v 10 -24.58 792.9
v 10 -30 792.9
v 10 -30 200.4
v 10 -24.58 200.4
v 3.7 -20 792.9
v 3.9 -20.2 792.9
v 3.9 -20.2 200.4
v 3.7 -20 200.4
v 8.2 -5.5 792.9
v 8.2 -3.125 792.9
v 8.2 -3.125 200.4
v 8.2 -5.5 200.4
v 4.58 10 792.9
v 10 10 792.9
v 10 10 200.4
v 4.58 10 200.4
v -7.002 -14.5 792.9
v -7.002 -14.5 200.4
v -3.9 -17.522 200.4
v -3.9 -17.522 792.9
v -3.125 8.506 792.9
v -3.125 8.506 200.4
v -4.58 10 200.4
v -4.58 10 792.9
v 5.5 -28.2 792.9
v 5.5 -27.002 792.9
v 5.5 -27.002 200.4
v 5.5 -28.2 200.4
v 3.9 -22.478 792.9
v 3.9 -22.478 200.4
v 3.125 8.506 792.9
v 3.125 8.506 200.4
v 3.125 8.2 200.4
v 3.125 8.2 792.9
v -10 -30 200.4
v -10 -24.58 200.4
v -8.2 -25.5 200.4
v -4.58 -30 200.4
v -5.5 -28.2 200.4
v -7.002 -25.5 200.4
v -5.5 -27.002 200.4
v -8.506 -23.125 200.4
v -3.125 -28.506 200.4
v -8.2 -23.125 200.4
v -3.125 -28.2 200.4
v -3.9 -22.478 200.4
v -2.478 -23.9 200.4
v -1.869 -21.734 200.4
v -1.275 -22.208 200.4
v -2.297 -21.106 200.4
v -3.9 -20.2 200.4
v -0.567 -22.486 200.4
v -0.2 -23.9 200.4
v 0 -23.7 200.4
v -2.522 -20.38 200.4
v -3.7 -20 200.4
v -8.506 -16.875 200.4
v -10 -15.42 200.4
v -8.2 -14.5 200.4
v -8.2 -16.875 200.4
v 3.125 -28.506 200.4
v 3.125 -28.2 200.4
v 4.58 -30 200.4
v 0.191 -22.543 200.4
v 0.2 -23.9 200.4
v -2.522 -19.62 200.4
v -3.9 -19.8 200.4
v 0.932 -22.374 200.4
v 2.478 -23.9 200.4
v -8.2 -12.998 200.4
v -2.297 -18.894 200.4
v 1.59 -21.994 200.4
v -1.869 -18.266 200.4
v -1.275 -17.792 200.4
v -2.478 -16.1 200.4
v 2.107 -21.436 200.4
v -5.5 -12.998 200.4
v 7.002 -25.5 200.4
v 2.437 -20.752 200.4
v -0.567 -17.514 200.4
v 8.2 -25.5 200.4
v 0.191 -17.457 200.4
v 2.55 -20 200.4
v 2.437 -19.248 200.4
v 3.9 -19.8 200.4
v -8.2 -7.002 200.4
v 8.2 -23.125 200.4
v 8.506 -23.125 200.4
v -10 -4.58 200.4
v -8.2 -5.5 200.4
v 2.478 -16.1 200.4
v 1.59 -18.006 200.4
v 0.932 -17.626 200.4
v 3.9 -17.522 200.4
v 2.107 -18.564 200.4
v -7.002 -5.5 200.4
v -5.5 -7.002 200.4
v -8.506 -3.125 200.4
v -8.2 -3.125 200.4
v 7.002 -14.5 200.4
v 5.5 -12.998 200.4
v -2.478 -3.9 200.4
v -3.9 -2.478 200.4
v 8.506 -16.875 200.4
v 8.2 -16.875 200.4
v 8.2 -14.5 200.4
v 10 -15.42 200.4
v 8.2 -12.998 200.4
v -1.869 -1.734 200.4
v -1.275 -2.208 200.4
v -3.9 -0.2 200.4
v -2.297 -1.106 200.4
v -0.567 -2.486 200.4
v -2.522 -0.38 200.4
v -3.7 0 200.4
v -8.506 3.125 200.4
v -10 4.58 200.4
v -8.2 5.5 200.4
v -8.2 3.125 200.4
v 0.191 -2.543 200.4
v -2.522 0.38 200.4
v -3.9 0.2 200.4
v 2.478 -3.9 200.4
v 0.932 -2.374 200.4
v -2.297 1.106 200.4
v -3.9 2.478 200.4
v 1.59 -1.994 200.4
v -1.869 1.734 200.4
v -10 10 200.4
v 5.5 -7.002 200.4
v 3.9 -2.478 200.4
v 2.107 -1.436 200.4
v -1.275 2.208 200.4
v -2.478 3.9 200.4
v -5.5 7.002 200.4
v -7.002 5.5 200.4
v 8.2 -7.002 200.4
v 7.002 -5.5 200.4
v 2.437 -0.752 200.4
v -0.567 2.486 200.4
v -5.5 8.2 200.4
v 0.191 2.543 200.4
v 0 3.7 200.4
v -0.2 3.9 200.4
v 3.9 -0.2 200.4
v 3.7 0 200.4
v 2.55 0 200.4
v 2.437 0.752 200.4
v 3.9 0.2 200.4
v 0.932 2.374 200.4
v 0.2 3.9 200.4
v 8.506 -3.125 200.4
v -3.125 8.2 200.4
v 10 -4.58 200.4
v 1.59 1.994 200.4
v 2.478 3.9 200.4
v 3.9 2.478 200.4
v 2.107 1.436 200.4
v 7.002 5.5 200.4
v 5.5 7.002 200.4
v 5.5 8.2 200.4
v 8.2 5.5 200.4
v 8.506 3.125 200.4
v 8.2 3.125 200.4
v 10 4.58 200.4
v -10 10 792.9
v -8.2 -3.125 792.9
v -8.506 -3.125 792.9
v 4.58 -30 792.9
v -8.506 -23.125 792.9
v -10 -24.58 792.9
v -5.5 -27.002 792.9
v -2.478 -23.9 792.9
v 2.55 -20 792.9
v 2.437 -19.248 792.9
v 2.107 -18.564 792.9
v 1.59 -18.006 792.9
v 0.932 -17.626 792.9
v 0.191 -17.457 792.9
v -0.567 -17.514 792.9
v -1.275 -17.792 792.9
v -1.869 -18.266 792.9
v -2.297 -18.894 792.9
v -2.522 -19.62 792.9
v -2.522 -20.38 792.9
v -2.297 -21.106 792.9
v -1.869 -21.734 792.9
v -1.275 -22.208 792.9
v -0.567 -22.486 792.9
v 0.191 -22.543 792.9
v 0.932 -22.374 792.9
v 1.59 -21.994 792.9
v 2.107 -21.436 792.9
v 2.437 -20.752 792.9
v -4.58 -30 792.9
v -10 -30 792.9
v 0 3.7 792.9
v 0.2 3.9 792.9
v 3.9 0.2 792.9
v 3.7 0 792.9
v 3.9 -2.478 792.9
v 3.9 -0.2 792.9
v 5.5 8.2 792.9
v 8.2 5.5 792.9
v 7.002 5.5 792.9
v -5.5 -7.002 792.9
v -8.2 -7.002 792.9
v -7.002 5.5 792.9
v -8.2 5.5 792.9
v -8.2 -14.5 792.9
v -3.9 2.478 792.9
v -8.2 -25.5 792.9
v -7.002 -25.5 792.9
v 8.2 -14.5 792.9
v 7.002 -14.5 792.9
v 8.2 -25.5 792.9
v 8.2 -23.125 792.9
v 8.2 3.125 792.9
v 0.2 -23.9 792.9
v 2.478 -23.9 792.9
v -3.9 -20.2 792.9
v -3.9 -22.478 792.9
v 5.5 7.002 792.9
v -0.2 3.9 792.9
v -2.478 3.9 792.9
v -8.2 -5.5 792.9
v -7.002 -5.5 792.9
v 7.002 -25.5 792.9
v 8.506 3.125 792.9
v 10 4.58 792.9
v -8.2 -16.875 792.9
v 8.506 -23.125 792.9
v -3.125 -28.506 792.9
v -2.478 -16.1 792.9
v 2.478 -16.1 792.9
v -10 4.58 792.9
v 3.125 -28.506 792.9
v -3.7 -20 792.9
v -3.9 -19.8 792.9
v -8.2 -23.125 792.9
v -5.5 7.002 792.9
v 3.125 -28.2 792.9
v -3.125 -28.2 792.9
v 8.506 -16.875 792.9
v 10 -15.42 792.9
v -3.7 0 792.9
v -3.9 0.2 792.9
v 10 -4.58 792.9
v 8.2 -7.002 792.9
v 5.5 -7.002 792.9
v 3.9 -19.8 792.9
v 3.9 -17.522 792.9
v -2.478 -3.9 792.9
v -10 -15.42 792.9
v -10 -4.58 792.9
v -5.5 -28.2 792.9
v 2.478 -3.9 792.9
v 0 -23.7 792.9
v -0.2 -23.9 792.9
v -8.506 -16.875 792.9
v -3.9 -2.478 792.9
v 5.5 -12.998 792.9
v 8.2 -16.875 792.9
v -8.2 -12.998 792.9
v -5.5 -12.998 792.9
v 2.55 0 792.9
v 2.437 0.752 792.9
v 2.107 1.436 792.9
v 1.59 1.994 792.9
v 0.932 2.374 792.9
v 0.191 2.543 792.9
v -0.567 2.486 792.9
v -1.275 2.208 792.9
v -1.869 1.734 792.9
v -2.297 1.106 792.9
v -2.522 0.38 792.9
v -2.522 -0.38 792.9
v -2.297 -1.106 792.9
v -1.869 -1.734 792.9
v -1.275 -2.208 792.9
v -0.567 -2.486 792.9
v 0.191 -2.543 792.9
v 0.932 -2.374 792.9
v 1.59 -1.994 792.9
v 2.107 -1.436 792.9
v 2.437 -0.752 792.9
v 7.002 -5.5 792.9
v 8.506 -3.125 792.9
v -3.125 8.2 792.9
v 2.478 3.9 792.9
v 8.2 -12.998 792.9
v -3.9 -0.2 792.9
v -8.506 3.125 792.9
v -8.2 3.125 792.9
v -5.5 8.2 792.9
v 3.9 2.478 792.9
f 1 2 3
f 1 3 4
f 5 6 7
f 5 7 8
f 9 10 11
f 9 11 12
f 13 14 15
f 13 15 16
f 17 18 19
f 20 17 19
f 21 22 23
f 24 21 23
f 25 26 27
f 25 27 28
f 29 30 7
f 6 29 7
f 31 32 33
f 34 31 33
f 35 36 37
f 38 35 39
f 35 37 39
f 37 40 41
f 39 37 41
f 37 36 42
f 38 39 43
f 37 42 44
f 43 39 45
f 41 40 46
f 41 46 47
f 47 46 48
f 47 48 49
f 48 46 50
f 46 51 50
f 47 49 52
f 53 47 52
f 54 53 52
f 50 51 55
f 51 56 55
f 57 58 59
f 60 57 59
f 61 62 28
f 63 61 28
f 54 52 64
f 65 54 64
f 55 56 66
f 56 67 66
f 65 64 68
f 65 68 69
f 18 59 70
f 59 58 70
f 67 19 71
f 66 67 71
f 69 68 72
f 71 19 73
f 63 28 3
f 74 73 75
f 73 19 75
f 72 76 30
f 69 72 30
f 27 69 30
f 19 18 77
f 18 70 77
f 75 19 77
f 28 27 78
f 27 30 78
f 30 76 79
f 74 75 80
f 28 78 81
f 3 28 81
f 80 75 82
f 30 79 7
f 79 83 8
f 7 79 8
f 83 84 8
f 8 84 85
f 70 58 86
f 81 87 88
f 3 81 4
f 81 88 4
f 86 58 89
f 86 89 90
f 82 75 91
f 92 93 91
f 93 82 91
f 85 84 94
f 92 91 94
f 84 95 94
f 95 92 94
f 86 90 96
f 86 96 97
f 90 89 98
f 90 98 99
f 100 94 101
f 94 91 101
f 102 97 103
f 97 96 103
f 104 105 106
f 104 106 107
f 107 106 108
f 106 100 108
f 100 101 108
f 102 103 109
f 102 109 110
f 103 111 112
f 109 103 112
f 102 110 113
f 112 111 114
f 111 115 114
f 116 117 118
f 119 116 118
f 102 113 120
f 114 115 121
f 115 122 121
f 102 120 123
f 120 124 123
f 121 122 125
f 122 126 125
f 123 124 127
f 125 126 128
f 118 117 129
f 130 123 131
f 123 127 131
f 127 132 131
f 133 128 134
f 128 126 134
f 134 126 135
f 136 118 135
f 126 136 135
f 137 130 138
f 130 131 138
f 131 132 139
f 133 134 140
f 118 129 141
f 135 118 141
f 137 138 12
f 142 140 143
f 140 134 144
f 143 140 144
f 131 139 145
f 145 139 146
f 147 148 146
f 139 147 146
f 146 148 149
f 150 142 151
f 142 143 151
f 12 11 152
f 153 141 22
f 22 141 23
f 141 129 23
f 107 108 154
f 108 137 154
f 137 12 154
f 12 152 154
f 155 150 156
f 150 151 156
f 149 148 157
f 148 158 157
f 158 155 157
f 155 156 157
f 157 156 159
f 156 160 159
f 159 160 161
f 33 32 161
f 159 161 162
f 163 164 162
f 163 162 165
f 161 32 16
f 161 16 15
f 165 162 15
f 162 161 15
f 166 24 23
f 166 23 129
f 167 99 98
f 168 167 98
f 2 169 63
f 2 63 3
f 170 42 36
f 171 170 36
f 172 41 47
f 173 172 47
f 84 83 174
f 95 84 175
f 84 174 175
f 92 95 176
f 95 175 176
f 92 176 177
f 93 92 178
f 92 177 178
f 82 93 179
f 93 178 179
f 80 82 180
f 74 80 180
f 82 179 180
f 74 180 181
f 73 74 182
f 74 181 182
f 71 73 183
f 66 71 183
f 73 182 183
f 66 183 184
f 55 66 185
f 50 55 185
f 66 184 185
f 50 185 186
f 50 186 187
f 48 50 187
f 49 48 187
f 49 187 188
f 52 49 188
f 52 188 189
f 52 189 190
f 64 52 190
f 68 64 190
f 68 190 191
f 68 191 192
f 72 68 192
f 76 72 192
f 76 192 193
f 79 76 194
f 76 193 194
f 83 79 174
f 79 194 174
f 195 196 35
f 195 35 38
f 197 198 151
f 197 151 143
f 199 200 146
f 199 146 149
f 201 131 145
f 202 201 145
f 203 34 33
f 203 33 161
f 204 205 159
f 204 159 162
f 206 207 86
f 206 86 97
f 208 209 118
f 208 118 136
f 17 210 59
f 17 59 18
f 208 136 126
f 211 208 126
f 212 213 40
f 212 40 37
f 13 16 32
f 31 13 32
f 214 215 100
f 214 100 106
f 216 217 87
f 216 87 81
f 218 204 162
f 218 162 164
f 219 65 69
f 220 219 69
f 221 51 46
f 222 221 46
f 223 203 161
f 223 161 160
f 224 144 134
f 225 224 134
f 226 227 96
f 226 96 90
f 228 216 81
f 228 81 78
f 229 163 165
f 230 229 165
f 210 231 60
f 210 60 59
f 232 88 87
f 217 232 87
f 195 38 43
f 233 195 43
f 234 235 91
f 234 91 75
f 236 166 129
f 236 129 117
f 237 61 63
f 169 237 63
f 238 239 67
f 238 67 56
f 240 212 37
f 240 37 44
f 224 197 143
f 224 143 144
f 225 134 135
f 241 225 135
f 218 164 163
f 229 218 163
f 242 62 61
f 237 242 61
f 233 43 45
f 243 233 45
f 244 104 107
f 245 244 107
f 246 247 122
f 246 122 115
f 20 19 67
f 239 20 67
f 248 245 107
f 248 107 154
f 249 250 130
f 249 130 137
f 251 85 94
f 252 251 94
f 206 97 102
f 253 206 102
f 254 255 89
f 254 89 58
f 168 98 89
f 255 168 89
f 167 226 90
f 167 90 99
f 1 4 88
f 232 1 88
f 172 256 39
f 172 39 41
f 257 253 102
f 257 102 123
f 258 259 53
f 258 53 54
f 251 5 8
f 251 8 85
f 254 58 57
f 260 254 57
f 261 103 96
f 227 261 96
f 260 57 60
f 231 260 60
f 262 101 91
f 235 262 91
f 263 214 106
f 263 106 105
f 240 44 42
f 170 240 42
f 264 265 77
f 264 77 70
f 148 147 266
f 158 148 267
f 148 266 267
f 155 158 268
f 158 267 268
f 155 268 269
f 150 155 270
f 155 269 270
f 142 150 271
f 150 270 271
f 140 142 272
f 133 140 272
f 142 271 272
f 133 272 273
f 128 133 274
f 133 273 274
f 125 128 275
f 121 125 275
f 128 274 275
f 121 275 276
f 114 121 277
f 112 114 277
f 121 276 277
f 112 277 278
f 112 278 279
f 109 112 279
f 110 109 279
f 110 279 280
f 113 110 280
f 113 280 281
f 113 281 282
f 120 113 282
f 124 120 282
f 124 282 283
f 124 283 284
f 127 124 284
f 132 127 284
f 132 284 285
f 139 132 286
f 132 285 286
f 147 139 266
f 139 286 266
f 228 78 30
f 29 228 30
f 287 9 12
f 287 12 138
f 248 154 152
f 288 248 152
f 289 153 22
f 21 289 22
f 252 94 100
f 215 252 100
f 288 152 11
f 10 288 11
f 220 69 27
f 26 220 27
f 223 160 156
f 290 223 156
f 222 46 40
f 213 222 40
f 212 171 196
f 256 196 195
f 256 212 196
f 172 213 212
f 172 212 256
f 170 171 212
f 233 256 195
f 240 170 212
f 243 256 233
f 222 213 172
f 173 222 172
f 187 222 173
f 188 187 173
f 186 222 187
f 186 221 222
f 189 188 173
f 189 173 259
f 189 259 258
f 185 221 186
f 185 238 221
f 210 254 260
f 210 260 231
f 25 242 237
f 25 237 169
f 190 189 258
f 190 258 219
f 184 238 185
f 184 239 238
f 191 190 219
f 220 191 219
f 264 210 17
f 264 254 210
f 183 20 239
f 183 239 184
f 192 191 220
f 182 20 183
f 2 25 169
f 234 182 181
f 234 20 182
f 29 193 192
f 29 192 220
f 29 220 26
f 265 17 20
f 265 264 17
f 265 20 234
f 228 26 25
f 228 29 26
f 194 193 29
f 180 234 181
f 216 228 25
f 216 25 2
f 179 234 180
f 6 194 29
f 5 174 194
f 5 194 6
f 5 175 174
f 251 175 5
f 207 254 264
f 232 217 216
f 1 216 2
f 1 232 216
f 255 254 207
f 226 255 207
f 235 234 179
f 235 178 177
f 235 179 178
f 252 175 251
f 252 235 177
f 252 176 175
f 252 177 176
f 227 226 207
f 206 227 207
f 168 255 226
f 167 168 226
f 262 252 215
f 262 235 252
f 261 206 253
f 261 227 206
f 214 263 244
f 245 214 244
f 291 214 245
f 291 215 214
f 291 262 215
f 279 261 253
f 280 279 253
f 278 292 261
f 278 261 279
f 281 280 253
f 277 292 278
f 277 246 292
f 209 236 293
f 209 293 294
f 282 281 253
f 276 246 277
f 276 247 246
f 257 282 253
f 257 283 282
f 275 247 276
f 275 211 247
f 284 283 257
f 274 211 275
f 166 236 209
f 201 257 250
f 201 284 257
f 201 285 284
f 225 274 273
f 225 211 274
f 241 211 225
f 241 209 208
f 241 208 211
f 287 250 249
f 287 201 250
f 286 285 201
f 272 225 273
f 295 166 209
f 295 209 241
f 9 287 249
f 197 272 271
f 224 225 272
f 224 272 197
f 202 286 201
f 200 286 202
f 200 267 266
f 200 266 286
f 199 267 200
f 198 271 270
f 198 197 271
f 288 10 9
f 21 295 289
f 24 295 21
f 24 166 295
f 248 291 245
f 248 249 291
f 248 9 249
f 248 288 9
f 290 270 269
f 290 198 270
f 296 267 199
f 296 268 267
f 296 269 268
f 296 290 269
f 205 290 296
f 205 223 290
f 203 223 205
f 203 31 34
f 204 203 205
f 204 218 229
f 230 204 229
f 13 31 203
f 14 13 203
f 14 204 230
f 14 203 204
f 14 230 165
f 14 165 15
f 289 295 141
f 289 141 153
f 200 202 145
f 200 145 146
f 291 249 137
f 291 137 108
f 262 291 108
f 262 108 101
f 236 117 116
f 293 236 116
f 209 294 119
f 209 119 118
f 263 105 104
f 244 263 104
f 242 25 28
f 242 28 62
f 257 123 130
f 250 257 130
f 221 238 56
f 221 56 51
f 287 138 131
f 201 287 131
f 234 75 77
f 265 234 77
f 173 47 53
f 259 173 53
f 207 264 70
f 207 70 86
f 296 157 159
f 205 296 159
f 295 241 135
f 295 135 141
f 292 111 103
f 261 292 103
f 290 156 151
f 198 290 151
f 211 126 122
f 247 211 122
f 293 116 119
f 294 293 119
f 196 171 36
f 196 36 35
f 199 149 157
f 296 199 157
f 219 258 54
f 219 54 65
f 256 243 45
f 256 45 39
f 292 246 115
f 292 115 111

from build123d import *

# Parameters (mm, degrees)
SKETCH_1_R      = 2.55
EXTRUDE_1_DEPTH = 592.5


with BuildPart() as part:
    # Эскиз1 → Бобышка-Вытянуть1 (new body)
    with BuildSketch(Plane.XY.offset(792.9)):
        Polygon((-8.2, -3.125), (-8.506400721, -3.125), (-10, -4.58), (-10, -15.42), (-8.506400721, -16.875), (-8.2, -16.875), (-8.2, -14.5), (-7.00202244, -14.5), (-3.9, -17.521856474), (-3.9, -19.8), (-3.7, -20), (-3.9, -20.2), (-3.9, -22.478143526), (-7.00202244, -25.5), (-8.2, -25.5), (-8.2, -23.125), (-8.506400721, -23.125), (-10, -24.58), (-10, -30), (-4.58, -30), (-3.125, -28.506400721), (-3.125, -28.2), (-5.5, -28.2), (-5.5, -27.00202244), (-2.478143526, -23.9), (-0.2, -23.9), (0, -23.7), (0.2, -23.9), (2.478143526, -23.9), (5.5, -27.00202244), (5.5, -28.2), (3.125, -28.2), (3.125, -28.506400721), (4.58, -30), (10, -30), (10, -24.58), (8.506400721, -23.125), (8.2, -23.125), (8.2, -25.5), (7.00202244, -25.5), (3.9, -22.478143526), (3.9, -20.2), (3.7, -20), (3.9, -19.8), (3.9, -17.521856474), (7.00202244, -14.5), (8.2, -14.5), (8.2, -16.875), (8.506400721, -16.875), (10, -15.42), (10, -4.58), (8.506400721, -3.125), (8.2, -3.125), (8.2, -5.5), (7.00202244, -5.5), (3.9, -2.478143526), (3.9, -0.2), (3.7, 0), (3.9, 0.2), (3.9, 2.478143526), (7.00202244, 5.5), (8.2, 5.5), (8.2, 3.125), (8.506400721, 3.125), (10, 4.58), (10, 10), (4.58, 10), (3.125, 8.506400721), (3.125, 8.2), (5.5, 8.2), (5.5, 7.00202244), (2.478143526, 3.9), (0.2, 3.9), (0, 3.7), (-0.2, 3.9), (-2.478143526, 3.9), (-5.5, 7.00202244), (-5.5, 8.2), (-3.125, 8.2), (-3.125, 8.506400721), (-4.58, 10), (-10, 10), (-10, 4.58), (-8.506400721, 3.125), (-8.2, 3.125), (-8.2, 5.5), (-7.00202244, 5.5), (-3.9, 2.478143526), (-3.9, 0.2), (-3.7, 0), (-3.9, -0.2), (-3.9, -2.478143526), (-7.00202244, -5.5), (-8.2, -5.5), align=None)
        Circle(SKETCH_1_R, mode=Mode.SUBTRACT)
        with Locations((0, -20)):
            Circle(SKETCH_1_R, mode=Mode.SUBTRACT)
        Polygon((-2.478143526, -3.9), (2.478143526, -3.9), (5.5, -7.00202244), (8.2, -7.00202244), (8.2, -12.99797756), (5.5, -12.99797756), (2.478143526, -16.1), (-2.478143526, -16.1), (-5.5, -12.99797756), (-8.2, -12.99797756), (-8.2, -7.00202244), (-5.5, -7.00202244), align=None, mode=Mode.SUBTRACT)
    extrude(amount=-EXTRUDE_1_DEPTH)


solid = part.part
